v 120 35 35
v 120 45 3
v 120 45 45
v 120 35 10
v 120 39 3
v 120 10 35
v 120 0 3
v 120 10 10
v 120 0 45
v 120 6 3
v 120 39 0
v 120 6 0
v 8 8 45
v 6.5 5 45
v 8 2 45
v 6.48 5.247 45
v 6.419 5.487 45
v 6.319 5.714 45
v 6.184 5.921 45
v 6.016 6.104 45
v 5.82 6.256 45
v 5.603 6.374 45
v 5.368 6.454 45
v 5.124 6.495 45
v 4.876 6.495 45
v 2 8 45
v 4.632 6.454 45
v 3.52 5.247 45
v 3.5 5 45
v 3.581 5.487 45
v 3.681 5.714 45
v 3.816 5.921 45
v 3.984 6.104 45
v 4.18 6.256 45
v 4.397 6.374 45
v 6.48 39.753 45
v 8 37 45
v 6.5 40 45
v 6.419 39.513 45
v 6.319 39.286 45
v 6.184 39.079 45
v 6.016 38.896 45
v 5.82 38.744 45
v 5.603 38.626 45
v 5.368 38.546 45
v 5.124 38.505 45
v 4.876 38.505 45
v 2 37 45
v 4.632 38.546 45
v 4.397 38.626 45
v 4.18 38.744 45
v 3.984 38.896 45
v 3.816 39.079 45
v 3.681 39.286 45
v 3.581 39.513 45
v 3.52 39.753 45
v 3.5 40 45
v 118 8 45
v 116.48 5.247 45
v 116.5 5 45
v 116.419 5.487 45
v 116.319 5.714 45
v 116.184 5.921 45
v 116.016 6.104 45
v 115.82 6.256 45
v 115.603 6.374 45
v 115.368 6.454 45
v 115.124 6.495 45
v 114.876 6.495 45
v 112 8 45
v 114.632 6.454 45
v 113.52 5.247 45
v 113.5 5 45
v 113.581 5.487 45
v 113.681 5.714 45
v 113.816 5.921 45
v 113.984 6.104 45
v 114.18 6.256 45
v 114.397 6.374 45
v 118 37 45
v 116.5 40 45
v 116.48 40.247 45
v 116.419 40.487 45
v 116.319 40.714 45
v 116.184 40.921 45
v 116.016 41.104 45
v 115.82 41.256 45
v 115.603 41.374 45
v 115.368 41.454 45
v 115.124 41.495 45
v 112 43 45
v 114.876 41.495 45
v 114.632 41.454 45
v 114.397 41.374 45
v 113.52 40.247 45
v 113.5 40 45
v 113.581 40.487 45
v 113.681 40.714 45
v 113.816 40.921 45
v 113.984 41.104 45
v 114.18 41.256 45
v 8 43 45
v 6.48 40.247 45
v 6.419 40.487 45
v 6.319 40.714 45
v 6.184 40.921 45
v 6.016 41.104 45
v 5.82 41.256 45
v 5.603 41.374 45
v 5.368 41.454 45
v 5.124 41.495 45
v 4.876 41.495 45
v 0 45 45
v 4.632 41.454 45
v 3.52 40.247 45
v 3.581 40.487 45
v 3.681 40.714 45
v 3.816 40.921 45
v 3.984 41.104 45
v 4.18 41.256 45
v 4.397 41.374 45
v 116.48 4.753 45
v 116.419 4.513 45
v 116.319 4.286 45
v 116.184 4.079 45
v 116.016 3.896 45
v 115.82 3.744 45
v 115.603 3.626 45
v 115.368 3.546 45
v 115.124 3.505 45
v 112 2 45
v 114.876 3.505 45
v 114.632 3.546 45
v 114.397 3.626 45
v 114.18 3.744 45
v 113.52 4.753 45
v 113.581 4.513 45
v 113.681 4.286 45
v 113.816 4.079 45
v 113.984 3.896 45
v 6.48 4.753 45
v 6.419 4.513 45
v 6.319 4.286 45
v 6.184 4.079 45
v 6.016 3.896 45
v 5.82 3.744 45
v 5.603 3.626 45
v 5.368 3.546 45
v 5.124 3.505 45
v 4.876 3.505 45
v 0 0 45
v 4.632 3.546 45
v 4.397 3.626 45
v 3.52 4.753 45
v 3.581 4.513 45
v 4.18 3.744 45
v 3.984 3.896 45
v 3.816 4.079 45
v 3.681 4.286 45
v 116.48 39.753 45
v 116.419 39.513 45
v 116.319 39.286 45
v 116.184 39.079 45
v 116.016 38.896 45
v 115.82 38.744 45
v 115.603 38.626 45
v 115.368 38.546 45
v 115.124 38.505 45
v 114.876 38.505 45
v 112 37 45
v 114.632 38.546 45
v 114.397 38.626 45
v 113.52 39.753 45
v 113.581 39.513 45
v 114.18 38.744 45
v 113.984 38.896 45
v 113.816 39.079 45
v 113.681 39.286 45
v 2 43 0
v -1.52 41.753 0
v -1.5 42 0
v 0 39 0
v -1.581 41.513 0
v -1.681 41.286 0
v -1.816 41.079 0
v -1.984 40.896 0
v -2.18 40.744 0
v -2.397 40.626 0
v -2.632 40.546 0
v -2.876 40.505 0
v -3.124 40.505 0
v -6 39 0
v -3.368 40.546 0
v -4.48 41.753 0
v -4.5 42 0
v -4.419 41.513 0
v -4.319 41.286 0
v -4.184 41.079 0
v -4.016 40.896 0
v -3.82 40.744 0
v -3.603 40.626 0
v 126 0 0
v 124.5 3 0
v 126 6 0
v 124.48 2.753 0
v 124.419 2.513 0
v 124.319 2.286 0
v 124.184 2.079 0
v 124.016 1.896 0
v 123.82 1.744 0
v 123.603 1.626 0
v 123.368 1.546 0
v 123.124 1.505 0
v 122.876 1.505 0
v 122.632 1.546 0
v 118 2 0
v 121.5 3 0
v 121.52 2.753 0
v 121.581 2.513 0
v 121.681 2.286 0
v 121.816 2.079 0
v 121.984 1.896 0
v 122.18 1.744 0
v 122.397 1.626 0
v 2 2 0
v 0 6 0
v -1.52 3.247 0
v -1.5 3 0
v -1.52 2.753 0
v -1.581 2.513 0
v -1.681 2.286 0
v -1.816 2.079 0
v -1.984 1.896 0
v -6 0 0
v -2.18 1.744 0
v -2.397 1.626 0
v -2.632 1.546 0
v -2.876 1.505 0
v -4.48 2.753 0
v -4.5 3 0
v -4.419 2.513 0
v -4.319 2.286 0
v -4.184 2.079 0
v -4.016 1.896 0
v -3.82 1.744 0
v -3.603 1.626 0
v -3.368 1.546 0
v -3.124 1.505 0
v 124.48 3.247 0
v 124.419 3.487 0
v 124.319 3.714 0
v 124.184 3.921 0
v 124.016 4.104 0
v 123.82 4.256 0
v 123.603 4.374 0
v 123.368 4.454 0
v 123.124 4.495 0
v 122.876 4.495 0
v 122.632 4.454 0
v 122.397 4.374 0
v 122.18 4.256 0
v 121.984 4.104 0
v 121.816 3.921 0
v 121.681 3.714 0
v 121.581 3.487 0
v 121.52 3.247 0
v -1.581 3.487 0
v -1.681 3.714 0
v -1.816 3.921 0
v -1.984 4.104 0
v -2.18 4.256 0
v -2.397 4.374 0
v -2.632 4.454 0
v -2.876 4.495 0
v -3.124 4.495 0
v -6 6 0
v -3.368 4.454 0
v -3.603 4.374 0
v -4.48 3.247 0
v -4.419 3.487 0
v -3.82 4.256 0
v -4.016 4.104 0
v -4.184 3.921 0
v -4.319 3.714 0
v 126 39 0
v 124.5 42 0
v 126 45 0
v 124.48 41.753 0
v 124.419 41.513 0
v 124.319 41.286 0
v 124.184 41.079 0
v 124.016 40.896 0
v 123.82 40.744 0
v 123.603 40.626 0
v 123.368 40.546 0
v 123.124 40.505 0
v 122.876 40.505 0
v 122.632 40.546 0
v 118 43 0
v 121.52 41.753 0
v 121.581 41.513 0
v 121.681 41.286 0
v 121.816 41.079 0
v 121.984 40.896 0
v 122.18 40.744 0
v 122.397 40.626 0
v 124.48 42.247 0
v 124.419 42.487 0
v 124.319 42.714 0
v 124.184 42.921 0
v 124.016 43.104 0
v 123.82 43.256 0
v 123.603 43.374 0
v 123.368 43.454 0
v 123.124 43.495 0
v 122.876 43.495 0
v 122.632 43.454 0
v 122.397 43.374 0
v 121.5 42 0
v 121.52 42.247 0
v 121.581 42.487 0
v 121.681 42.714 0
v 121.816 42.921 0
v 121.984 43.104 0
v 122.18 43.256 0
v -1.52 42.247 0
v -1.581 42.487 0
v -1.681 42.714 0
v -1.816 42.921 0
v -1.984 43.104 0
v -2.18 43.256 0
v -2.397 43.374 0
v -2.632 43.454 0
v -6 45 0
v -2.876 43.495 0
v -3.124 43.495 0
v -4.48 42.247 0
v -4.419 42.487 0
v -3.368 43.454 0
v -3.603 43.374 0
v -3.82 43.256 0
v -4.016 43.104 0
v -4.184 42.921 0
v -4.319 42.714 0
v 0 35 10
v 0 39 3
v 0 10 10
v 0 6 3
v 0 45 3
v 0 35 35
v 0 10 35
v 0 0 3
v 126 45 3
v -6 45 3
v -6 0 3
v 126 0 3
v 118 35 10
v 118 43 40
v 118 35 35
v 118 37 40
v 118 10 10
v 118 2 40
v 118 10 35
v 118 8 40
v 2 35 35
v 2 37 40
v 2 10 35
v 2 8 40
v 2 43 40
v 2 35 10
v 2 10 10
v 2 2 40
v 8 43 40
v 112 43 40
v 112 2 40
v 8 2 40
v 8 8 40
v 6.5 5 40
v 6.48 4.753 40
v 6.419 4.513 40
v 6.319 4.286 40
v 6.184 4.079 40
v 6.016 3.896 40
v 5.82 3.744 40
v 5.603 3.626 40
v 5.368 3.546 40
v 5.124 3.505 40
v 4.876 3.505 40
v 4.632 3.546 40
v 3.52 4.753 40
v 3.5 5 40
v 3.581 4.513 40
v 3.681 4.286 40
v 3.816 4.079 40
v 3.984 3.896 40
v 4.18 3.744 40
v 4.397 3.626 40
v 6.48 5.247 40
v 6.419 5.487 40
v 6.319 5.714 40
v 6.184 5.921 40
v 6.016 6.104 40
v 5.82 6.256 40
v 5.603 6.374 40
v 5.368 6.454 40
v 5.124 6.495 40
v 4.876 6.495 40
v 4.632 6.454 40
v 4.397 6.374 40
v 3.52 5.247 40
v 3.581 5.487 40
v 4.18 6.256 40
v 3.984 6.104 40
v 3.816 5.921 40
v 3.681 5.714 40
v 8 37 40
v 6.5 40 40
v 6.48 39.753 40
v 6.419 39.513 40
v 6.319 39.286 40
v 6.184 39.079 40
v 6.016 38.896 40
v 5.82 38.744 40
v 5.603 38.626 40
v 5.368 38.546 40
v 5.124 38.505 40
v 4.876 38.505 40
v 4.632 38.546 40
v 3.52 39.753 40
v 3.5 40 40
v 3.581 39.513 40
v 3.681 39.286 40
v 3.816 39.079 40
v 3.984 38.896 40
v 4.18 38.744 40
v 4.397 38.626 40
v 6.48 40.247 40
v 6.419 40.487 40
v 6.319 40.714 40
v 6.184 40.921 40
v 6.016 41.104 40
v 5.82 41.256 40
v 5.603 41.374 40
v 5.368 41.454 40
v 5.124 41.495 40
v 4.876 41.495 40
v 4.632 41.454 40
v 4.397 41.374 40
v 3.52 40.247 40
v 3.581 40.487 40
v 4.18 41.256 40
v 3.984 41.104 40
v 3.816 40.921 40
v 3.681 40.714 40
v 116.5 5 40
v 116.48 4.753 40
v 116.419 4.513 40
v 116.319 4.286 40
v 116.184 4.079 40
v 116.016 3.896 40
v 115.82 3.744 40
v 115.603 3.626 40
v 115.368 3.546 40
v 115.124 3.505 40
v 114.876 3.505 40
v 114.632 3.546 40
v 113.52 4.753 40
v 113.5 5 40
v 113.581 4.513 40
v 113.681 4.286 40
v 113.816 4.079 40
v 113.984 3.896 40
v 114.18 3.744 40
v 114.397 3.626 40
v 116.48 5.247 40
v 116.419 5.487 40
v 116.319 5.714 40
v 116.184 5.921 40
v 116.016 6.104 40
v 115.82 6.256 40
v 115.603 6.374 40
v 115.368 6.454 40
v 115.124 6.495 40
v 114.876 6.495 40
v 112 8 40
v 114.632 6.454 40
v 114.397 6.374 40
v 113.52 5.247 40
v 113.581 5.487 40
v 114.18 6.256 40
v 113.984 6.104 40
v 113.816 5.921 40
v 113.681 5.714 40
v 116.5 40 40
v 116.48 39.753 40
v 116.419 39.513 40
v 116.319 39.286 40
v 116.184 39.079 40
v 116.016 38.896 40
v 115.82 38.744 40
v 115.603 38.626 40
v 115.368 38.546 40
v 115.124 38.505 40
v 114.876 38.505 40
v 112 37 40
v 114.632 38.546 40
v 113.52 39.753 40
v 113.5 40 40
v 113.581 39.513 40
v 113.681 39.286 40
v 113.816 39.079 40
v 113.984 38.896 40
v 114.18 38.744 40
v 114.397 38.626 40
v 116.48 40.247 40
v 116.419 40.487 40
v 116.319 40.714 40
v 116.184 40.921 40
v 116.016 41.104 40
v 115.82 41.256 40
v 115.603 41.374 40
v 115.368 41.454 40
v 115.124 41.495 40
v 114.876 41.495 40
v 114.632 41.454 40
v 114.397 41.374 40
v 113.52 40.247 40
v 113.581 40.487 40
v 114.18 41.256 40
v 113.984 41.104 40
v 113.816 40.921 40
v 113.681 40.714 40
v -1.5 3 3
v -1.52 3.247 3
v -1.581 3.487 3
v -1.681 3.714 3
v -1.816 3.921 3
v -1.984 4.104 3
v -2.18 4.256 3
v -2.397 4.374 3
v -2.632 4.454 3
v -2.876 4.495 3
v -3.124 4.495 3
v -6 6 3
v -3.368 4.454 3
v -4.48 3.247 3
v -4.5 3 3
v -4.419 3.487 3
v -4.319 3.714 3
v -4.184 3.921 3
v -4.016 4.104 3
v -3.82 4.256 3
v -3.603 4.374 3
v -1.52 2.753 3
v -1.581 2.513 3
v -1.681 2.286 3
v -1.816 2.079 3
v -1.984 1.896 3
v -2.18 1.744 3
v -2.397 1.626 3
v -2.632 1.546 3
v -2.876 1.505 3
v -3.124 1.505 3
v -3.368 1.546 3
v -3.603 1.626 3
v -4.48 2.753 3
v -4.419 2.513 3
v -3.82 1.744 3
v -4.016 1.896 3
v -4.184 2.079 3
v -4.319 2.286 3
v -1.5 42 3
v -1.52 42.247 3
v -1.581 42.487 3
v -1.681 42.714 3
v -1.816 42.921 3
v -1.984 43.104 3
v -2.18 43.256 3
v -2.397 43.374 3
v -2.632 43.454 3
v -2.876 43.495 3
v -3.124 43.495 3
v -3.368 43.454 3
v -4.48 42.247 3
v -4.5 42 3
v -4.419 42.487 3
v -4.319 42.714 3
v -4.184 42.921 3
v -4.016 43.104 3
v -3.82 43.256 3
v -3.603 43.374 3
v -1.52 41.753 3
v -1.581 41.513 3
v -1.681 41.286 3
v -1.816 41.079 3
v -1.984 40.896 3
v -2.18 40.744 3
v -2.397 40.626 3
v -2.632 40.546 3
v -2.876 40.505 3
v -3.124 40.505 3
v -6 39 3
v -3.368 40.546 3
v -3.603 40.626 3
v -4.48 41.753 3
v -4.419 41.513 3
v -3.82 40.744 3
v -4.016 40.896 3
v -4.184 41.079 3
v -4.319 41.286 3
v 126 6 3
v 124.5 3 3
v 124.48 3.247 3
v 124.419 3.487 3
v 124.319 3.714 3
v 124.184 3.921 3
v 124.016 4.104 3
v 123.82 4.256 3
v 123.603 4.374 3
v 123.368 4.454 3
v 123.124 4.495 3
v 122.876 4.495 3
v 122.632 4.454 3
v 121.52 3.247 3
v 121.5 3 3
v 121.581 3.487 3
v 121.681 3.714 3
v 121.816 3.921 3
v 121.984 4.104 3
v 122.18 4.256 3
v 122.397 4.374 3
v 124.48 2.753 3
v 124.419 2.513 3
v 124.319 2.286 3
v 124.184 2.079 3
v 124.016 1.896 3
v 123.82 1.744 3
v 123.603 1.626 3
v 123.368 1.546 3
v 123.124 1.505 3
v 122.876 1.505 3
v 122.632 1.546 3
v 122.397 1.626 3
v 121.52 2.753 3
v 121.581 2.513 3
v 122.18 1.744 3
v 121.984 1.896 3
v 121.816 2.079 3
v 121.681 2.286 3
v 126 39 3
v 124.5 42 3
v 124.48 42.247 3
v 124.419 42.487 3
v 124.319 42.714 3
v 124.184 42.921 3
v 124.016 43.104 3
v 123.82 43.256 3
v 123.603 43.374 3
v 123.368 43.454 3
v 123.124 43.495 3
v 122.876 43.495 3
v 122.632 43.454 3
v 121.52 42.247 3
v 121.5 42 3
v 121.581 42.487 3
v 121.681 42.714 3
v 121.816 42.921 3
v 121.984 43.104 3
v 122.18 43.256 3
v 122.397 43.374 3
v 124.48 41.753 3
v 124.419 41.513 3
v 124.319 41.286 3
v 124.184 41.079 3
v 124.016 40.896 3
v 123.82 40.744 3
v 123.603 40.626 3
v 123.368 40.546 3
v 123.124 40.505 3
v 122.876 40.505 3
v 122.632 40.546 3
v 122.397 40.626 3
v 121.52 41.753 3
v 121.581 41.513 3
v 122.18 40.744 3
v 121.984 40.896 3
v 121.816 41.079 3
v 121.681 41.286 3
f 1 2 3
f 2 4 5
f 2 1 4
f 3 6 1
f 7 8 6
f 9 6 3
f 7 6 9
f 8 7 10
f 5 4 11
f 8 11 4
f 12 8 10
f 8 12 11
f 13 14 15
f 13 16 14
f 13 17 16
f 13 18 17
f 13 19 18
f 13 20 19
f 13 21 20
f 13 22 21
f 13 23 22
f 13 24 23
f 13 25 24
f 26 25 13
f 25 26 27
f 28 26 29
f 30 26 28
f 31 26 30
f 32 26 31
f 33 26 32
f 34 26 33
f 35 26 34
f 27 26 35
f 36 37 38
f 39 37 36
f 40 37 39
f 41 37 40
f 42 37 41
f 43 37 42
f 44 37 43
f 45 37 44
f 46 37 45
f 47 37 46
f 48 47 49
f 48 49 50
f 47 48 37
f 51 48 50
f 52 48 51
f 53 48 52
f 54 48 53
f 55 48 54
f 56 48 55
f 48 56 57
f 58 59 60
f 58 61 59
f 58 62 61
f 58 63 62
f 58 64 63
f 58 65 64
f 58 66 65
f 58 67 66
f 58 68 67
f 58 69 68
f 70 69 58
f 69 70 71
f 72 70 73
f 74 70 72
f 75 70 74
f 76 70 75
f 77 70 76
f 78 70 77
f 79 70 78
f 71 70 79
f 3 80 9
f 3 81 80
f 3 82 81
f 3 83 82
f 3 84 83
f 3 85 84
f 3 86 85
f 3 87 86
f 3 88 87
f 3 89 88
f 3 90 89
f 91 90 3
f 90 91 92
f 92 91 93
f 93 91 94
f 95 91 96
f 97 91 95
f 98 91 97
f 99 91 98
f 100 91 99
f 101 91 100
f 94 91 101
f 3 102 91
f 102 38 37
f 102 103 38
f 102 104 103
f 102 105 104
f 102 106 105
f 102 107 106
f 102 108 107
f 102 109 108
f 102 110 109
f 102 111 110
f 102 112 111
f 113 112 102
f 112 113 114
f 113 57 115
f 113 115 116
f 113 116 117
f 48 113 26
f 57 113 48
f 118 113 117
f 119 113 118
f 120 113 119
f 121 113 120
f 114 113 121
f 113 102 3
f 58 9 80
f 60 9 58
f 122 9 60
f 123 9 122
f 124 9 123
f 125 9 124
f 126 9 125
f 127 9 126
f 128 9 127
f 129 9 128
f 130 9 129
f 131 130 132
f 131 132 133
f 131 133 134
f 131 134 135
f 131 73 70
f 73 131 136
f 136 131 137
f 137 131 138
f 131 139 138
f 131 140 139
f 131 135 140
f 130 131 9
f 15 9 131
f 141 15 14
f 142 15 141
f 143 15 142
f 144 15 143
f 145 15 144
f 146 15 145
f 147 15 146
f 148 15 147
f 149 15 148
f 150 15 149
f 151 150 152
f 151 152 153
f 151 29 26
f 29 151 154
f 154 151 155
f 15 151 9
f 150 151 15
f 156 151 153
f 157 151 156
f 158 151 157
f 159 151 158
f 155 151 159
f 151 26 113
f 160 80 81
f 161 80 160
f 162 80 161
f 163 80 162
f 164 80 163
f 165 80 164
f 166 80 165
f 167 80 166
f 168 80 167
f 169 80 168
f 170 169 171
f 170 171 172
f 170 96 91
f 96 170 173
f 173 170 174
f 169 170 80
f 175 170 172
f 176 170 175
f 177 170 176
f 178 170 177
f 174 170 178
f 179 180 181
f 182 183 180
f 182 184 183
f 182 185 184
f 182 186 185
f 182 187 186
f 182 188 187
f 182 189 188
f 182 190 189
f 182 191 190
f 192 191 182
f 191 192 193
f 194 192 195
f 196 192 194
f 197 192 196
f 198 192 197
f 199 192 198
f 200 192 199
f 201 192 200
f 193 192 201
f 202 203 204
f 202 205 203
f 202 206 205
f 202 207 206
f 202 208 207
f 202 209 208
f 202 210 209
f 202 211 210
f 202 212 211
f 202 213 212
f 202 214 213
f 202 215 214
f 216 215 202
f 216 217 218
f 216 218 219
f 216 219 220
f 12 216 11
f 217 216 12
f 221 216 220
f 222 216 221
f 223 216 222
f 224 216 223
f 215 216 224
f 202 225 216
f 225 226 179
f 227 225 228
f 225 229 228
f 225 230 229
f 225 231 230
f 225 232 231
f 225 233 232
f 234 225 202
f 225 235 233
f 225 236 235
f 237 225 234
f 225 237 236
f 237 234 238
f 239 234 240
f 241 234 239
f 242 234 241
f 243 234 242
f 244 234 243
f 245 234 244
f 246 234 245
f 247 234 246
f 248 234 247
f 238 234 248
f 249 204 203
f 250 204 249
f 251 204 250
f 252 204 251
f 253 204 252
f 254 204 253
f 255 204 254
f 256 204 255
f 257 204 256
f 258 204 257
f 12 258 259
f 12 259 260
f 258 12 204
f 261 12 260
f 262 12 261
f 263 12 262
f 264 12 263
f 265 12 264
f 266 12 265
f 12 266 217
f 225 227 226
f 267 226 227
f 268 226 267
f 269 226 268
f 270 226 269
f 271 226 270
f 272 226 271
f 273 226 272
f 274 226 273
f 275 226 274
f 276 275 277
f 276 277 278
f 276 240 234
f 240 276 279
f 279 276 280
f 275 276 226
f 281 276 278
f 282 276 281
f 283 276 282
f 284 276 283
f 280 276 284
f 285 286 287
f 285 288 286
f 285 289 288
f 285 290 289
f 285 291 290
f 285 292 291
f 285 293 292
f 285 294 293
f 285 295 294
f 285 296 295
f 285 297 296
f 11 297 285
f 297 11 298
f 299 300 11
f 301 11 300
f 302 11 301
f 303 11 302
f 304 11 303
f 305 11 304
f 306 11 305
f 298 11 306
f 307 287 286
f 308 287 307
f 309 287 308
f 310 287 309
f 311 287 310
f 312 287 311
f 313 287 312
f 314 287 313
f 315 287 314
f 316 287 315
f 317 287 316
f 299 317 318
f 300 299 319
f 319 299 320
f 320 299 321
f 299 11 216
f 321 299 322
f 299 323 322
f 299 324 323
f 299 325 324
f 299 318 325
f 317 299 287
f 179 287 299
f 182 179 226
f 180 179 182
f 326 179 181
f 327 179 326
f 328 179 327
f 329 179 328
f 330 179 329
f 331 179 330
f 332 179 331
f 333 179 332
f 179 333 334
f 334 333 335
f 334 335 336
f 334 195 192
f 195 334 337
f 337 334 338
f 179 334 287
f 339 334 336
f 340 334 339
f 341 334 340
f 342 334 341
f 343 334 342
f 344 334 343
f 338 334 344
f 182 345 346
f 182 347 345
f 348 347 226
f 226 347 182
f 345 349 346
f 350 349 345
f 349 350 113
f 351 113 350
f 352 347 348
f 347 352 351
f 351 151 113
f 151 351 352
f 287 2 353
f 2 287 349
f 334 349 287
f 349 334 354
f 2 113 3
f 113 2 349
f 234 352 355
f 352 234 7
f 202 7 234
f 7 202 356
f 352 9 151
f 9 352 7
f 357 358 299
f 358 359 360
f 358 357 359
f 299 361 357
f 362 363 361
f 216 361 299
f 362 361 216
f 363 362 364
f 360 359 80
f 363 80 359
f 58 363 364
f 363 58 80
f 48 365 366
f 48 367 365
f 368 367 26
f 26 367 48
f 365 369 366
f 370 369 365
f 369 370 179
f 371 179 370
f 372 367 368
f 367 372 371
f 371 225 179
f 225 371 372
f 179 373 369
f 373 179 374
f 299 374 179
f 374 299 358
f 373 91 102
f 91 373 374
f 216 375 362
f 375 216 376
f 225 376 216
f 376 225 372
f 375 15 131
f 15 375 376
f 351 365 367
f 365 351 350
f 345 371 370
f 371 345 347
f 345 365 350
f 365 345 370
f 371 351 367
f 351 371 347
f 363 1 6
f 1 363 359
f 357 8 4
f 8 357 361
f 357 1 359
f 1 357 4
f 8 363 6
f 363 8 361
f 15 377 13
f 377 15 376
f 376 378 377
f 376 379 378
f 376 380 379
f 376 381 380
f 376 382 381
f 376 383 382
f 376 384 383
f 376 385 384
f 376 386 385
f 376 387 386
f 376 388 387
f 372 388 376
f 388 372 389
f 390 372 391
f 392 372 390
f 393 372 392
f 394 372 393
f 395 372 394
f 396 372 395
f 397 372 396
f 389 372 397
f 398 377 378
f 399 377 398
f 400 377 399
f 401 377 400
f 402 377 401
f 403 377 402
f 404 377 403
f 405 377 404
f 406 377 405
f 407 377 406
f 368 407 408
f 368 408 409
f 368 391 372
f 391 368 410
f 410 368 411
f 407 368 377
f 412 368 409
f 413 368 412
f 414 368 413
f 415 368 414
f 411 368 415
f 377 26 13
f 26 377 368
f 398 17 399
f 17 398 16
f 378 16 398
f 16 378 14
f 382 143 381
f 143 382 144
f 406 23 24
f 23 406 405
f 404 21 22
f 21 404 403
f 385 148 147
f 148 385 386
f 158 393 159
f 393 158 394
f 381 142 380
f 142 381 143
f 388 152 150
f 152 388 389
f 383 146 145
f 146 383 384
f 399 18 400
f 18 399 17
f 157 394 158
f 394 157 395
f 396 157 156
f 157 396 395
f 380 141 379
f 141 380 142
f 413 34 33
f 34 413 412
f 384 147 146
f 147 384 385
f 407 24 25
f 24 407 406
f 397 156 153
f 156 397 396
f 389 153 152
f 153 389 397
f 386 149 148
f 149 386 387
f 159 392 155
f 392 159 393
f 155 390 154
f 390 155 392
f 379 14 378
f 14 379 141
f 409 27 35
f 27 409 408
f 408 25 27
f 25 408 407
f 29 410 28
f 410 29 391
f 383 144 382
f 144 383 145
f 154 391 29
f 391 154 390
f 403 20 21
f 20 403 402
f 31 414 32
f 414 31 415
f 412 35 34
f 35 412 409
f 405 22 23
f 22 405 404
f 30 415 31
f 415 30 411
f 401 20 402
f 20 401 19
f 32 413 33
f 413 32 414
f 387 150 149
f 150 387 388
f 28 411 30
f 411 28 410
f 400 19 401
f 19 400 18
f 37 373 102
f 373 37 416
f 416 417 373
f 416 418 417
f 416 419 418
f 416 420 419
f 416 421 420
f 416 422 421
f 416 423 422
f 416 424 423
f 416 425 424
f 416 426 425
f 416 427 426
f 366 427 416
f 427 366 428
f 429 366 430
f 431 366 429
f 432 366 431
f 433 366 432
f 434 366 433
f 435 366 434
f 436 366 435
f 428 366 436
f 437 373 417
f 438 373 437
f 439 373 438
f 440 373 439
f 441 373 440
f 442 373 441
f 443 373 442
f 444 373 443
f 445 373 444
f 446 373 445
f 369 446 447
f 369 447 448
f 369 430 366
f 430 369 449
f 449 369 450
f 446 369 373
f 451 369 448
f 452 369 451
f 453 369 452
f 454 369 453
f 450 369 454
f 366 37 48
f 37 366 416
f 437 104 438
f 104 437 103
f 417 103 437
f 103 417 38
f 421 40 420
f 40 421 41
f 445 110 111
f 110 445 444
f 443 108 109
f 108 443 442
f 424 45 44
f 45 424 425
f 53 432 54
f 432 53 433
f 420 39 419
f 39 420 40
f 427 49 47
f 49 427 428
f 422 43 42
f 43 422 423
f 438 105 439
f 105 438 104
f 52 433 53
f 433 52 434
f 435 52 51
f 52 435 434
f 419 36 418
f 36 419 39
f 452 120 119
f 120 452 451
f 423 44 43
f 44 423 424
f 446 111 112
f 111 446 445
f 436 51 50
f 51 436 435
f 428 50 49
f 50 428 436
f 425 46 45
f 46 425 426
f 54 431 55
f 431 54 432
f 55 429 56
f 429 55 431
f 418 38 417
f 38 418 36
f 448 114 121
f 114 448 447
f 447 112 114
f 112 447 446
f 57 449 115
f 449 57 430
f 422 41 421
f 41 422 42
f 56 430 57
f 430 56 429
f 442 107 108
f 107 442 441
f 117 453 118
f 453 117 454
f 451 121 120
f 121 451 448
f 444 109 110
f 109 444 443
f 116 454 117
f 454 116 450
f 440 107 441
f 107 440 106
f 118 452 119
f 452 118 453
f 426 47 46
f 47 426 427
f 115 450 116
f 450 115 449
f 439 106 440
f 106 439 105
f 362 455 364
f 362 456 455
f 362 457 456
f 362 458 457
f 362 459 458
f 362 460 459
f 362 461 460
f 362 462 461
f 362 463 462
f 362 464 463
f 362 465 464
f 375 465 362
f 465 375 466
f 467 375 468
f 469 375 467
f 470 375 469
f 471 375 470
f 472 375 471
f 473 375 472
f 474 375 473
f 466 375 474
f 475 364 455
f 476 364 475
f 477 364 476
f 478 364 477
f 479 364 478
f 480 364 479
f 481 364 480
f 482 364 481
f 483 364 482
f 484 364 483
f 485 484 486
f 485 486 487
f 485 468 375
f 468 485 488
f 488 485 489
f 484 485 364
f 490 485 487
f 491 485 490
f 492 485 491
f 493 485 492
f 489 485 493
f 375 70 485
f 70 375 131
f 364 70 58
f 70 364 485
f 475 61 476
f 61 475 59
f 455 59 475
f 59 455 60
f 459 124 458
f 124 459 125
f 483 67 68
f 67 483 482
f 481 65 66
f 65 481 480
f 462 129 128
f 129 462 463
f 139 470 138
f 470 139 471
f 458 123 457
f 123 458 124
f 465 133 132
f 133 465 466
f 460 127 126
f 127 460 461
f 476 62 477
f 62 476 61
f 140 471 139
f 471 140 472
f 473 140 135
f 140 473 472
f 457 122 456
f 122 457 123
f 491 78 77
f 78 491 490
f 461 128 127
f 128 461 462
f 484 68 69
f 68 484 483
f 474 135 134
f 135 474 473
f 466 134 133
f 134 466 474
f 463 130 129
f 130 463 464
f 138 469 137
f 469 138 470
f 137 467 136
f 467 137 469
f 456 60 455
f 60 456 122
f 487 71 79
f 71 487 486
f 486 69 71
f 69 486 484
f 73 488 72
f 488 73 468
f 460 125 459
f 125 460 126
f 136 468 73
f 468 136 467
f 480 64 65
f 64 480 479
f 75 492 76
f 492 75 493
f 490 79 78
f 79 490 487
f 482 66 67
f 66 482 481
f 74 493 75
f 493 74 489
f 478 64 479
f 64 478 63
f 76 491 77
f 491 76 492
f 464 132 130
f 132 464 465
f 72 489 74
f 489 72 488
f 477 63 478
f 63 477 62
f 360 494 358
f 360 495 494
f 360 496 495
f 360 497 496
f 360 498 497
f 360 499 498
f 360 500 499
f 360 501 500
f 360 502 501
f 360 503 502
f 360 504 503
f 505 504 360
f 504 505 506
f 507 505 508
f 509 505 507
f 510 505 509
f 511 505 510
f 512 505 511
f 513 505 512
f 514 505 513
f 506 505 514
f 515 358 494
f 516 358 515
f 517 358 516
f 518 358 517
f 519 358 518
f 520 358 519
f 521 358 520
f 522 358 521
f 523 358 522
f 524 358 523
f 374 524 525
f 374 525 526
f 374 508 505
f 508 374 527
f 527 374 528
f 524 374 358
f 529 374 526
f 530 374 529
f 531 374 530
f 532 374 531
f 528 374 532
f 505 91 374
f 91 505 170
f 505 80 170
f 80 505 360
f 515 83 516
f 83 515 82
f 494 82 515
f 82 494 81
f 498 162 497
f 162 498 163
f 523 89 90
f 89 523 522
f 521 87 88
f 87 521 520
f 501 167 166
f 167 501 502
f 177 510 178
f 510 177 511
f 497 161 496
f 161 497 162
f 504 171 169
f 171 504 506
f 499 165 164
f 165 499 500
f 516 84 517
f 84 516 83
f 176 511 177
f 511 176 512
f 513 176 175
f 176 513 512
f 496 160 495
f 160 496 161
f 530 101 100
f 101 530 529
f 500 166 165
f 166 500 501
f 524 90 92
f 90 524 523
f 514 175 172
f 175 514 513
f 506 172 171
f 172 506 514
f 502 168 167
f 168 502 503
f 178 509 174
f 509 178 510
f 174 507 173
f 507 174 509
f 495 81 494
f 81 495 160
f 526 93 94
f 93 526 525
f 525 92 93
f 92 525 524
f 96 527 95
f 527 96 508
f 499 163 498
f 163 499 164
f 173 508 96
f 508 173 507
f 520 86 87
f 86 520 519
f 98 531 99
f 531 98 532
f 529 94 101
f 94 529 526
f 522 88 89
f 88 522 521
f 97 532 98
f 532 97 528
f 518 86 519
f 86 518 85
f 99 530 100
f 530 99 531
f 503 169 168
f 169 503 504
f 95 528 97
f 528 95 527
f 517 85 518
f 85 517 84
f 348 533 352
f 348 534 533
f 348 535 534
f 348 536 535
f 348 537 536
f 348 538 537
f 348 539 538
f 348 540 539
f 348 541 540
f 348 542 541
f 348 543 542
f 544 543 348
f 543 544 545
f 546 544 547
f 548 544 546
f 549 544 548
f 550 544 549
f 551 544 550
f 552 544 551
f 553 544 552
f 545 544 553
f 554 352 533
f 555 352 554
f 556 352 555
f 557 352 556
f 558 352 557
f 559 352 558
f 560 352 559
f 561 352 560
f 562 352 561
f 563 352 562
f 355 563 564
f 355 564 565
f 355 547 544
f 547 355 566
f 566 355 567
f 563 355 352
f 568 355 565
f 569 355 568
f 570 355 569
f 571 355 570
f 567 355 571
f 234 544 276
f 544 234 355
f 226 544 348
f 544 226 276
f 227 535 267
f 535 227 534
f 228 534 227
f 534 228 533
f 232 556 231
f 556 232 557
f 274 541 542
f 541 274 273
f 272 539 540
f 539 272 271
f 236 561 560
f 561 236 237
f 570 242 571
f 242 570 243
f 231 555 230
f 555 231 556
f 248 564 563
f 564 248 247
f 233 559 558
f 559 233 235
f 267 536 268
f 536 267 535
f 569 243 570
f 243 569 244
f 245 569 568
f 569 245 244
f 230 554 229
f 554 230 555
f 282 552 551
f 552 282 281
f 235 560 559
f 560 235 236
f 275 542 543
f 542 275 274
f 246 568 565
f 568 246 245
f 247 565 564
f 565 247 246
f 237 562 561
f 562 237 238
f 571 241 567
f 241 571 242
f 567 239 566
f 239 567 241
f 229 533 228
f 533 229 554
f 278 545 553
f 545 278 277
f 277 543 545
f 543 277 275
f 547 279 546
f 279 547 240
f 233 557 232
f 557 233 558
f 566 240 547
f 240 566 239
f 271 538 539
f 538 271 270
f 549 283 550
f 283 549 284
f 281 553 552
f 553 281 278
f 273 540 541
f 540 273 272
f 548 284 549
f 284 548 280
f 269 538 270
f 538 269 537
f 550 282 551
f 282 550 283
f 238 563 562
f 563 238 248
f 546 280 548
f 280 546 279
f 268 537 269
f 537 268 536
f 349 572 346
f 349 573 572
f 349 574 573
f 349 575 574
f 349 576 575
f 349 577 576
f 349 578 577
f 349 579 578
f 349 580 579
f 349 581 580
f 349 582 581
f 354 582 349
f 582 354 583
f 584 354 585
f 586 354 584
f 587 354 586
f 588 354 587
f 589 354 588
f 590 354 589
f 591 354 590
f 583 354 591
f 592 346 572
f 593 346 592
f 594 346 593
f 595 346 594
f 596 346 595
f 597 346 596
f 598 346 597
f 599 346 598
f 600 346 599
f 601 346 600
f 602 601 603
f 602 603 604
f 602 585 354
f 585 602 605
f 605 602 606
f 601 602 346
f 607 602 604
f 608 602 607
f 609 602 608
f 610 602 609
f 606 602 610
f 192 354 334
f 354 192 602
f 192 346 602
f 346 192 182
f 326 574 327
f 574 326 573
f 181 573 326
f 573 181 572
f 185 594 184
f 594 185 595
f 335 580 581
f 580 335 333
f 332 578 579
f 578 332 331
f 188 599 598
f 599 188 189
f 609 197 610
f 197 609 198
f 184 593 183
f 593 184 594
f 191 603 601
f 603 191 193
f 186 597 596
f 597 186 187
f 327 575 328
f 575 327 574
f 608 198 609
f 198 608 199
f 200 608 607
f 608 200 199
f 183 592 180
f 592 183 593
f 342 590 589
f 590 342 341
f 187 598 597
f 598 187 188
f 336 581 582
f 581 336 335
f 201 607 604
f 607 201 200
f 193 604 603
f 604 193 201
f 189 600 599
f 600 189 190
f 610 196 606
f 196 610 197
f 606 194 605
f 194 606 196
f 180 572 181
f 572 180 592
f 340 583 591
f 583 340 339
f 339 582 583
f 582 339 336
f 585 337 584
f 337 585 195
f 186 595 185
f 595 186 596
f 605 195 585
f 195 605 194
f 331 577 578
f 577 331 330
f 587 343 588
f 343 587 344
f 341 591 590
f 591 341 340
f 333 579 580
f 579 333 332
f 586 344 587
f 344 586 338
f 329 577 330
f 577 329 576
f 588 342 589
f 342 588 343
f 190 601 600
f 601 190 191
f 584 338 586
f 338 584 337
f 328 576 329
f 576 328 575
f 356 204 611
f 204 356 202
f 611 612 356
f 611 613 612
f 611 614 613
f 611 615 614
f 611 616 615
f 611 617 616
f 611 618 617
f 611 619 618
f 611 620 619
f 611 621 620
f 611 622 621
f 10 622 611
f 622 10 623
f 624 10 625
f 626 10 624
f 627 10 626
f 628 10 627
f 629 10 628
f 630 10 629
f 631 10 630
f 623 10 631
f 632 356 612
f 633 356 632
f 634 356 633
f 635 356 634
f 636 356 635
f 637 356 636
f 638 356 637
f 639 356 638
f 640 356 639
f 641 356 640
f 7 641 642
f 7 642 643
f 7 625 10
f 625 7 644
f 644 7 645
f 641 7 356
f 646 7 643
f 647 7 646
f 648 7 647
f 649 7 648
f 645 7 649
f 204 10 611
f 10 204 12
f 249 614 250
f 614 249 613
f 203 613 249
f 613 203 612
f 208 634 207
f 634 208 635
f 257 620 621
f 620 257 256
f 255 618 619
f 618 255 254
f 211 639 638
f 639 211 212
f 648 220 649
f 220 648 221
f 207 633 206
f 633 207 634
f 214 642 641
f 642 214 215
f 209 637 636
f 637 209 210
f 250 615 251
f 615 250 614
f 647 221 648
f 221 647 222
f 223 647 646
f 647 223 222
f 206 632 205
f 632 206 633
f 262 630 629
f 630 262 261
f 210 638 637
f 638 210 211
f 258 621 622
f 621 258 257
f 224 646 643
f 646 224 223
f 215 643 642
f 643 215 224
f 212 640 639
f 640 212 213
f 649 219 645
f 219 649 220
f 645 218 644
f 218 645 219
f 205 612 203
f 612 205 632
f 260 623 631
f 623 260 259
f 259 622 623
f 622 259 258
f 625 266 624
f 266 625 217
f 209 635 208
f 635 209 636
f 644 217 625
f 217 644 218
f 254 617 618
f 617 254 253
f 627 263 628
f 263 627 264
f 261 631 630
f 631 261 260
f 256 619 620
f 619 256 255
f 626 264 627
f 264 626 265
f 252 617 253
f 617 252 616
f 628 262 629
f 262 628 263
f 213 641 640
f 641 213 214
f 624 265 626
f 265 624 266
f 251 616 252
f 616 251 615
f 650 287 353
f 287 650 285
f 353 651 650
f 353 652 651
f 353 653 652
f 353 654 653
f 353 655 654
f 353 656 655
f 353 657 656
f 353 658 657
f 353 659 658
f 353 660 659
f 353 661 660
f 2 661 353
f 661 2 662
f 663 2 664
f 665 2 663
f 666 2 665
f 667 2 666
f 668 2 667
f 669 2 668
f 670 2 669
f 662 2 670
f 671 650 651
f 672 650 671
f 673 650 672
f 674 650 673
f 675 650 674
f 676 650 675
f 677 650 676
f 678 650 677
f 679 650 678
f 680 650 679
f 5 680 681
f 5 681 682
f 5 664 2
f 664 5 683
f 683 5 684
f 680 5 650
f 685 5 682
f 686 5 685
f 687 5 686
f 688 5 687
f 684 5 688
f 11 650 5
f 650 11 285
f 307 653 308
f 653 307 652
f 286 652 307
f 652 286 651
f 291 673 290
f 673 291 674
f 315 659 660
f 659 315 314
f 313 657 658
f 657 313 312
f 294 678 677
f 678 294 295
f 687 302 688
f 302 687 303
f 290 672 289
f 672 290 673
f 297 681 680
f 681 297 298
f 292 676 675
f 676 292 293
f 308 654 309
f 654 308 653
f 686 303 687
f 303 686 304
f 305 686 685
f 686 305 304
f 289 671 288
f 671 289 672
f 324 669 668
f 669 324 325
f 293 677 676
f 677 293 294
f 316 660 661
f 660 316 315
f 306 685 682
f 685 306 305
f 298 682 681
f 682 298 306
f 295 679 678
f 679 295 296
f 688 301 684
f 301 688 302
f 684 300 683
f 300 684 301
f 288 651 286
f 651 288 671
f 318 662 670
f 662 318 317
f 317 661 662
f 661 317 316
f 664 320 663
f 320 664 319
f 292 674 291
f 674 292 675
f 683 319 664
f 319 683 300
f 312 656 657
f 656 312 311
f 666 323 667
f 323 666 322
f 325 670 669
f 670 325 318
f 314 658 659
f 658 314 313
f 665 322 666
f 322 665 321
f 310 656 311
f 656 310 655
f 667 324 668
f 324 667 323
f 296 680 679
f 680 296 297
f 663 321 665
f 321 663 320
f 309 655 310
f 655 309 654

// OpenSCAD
$fa = 1;
$fs = .25;

height = 45;
width = 120;
depth = 45;
thickness = 2;
holes_indent = 5;
holes_h = 5;

module HoleSupport(h = 3)
{
    difference()
    {
        cube([ 6, 6, h ]);
        translate([ 3, 3, -1 ]) linear_extrude(h + 2) circle(1.5);
    }
}

union()
{
    difference()
    {
        cube([ width, height, depth ]);
        translate([ thickness, thickness, -1 ]) cube([ width - 2 * thickness, height - 2 * thickness, depth + 2 ]);
        translate([ -1, 10, 10 ]) cube([ thickness + 2, height - 20, 25 ]);
        translate([ width - thickness - 1, 10, 10 ]) cube([ thickness + 2, height - 20, 25 ]);
    }

    translate([ thickness, thickness, depth - holes_h ]) HoleSupport(holes_h);
    translate([ thickness, height - thickness - 6, depth - holes_h ]) HoleSupport(holes_h);
    translate([ width - thickness - 6, thickness, depth - holes_h ]) HoleSupport(holes_h);
    translate([ width - thickness - 6, height - thickness - 6, depth - holes_h ]) HoleSupport(holes_h);

    translate([ -6, 0, 0 ]) HoleSupport(3);
    translate([ -6, height - 6, 0 ]) HoleSupport(3);
    translate([ width, 0, 0 ]) HoleSupport(3);
    translate([ width, height - 6, 0 ]) HoleSupport(3);
}
